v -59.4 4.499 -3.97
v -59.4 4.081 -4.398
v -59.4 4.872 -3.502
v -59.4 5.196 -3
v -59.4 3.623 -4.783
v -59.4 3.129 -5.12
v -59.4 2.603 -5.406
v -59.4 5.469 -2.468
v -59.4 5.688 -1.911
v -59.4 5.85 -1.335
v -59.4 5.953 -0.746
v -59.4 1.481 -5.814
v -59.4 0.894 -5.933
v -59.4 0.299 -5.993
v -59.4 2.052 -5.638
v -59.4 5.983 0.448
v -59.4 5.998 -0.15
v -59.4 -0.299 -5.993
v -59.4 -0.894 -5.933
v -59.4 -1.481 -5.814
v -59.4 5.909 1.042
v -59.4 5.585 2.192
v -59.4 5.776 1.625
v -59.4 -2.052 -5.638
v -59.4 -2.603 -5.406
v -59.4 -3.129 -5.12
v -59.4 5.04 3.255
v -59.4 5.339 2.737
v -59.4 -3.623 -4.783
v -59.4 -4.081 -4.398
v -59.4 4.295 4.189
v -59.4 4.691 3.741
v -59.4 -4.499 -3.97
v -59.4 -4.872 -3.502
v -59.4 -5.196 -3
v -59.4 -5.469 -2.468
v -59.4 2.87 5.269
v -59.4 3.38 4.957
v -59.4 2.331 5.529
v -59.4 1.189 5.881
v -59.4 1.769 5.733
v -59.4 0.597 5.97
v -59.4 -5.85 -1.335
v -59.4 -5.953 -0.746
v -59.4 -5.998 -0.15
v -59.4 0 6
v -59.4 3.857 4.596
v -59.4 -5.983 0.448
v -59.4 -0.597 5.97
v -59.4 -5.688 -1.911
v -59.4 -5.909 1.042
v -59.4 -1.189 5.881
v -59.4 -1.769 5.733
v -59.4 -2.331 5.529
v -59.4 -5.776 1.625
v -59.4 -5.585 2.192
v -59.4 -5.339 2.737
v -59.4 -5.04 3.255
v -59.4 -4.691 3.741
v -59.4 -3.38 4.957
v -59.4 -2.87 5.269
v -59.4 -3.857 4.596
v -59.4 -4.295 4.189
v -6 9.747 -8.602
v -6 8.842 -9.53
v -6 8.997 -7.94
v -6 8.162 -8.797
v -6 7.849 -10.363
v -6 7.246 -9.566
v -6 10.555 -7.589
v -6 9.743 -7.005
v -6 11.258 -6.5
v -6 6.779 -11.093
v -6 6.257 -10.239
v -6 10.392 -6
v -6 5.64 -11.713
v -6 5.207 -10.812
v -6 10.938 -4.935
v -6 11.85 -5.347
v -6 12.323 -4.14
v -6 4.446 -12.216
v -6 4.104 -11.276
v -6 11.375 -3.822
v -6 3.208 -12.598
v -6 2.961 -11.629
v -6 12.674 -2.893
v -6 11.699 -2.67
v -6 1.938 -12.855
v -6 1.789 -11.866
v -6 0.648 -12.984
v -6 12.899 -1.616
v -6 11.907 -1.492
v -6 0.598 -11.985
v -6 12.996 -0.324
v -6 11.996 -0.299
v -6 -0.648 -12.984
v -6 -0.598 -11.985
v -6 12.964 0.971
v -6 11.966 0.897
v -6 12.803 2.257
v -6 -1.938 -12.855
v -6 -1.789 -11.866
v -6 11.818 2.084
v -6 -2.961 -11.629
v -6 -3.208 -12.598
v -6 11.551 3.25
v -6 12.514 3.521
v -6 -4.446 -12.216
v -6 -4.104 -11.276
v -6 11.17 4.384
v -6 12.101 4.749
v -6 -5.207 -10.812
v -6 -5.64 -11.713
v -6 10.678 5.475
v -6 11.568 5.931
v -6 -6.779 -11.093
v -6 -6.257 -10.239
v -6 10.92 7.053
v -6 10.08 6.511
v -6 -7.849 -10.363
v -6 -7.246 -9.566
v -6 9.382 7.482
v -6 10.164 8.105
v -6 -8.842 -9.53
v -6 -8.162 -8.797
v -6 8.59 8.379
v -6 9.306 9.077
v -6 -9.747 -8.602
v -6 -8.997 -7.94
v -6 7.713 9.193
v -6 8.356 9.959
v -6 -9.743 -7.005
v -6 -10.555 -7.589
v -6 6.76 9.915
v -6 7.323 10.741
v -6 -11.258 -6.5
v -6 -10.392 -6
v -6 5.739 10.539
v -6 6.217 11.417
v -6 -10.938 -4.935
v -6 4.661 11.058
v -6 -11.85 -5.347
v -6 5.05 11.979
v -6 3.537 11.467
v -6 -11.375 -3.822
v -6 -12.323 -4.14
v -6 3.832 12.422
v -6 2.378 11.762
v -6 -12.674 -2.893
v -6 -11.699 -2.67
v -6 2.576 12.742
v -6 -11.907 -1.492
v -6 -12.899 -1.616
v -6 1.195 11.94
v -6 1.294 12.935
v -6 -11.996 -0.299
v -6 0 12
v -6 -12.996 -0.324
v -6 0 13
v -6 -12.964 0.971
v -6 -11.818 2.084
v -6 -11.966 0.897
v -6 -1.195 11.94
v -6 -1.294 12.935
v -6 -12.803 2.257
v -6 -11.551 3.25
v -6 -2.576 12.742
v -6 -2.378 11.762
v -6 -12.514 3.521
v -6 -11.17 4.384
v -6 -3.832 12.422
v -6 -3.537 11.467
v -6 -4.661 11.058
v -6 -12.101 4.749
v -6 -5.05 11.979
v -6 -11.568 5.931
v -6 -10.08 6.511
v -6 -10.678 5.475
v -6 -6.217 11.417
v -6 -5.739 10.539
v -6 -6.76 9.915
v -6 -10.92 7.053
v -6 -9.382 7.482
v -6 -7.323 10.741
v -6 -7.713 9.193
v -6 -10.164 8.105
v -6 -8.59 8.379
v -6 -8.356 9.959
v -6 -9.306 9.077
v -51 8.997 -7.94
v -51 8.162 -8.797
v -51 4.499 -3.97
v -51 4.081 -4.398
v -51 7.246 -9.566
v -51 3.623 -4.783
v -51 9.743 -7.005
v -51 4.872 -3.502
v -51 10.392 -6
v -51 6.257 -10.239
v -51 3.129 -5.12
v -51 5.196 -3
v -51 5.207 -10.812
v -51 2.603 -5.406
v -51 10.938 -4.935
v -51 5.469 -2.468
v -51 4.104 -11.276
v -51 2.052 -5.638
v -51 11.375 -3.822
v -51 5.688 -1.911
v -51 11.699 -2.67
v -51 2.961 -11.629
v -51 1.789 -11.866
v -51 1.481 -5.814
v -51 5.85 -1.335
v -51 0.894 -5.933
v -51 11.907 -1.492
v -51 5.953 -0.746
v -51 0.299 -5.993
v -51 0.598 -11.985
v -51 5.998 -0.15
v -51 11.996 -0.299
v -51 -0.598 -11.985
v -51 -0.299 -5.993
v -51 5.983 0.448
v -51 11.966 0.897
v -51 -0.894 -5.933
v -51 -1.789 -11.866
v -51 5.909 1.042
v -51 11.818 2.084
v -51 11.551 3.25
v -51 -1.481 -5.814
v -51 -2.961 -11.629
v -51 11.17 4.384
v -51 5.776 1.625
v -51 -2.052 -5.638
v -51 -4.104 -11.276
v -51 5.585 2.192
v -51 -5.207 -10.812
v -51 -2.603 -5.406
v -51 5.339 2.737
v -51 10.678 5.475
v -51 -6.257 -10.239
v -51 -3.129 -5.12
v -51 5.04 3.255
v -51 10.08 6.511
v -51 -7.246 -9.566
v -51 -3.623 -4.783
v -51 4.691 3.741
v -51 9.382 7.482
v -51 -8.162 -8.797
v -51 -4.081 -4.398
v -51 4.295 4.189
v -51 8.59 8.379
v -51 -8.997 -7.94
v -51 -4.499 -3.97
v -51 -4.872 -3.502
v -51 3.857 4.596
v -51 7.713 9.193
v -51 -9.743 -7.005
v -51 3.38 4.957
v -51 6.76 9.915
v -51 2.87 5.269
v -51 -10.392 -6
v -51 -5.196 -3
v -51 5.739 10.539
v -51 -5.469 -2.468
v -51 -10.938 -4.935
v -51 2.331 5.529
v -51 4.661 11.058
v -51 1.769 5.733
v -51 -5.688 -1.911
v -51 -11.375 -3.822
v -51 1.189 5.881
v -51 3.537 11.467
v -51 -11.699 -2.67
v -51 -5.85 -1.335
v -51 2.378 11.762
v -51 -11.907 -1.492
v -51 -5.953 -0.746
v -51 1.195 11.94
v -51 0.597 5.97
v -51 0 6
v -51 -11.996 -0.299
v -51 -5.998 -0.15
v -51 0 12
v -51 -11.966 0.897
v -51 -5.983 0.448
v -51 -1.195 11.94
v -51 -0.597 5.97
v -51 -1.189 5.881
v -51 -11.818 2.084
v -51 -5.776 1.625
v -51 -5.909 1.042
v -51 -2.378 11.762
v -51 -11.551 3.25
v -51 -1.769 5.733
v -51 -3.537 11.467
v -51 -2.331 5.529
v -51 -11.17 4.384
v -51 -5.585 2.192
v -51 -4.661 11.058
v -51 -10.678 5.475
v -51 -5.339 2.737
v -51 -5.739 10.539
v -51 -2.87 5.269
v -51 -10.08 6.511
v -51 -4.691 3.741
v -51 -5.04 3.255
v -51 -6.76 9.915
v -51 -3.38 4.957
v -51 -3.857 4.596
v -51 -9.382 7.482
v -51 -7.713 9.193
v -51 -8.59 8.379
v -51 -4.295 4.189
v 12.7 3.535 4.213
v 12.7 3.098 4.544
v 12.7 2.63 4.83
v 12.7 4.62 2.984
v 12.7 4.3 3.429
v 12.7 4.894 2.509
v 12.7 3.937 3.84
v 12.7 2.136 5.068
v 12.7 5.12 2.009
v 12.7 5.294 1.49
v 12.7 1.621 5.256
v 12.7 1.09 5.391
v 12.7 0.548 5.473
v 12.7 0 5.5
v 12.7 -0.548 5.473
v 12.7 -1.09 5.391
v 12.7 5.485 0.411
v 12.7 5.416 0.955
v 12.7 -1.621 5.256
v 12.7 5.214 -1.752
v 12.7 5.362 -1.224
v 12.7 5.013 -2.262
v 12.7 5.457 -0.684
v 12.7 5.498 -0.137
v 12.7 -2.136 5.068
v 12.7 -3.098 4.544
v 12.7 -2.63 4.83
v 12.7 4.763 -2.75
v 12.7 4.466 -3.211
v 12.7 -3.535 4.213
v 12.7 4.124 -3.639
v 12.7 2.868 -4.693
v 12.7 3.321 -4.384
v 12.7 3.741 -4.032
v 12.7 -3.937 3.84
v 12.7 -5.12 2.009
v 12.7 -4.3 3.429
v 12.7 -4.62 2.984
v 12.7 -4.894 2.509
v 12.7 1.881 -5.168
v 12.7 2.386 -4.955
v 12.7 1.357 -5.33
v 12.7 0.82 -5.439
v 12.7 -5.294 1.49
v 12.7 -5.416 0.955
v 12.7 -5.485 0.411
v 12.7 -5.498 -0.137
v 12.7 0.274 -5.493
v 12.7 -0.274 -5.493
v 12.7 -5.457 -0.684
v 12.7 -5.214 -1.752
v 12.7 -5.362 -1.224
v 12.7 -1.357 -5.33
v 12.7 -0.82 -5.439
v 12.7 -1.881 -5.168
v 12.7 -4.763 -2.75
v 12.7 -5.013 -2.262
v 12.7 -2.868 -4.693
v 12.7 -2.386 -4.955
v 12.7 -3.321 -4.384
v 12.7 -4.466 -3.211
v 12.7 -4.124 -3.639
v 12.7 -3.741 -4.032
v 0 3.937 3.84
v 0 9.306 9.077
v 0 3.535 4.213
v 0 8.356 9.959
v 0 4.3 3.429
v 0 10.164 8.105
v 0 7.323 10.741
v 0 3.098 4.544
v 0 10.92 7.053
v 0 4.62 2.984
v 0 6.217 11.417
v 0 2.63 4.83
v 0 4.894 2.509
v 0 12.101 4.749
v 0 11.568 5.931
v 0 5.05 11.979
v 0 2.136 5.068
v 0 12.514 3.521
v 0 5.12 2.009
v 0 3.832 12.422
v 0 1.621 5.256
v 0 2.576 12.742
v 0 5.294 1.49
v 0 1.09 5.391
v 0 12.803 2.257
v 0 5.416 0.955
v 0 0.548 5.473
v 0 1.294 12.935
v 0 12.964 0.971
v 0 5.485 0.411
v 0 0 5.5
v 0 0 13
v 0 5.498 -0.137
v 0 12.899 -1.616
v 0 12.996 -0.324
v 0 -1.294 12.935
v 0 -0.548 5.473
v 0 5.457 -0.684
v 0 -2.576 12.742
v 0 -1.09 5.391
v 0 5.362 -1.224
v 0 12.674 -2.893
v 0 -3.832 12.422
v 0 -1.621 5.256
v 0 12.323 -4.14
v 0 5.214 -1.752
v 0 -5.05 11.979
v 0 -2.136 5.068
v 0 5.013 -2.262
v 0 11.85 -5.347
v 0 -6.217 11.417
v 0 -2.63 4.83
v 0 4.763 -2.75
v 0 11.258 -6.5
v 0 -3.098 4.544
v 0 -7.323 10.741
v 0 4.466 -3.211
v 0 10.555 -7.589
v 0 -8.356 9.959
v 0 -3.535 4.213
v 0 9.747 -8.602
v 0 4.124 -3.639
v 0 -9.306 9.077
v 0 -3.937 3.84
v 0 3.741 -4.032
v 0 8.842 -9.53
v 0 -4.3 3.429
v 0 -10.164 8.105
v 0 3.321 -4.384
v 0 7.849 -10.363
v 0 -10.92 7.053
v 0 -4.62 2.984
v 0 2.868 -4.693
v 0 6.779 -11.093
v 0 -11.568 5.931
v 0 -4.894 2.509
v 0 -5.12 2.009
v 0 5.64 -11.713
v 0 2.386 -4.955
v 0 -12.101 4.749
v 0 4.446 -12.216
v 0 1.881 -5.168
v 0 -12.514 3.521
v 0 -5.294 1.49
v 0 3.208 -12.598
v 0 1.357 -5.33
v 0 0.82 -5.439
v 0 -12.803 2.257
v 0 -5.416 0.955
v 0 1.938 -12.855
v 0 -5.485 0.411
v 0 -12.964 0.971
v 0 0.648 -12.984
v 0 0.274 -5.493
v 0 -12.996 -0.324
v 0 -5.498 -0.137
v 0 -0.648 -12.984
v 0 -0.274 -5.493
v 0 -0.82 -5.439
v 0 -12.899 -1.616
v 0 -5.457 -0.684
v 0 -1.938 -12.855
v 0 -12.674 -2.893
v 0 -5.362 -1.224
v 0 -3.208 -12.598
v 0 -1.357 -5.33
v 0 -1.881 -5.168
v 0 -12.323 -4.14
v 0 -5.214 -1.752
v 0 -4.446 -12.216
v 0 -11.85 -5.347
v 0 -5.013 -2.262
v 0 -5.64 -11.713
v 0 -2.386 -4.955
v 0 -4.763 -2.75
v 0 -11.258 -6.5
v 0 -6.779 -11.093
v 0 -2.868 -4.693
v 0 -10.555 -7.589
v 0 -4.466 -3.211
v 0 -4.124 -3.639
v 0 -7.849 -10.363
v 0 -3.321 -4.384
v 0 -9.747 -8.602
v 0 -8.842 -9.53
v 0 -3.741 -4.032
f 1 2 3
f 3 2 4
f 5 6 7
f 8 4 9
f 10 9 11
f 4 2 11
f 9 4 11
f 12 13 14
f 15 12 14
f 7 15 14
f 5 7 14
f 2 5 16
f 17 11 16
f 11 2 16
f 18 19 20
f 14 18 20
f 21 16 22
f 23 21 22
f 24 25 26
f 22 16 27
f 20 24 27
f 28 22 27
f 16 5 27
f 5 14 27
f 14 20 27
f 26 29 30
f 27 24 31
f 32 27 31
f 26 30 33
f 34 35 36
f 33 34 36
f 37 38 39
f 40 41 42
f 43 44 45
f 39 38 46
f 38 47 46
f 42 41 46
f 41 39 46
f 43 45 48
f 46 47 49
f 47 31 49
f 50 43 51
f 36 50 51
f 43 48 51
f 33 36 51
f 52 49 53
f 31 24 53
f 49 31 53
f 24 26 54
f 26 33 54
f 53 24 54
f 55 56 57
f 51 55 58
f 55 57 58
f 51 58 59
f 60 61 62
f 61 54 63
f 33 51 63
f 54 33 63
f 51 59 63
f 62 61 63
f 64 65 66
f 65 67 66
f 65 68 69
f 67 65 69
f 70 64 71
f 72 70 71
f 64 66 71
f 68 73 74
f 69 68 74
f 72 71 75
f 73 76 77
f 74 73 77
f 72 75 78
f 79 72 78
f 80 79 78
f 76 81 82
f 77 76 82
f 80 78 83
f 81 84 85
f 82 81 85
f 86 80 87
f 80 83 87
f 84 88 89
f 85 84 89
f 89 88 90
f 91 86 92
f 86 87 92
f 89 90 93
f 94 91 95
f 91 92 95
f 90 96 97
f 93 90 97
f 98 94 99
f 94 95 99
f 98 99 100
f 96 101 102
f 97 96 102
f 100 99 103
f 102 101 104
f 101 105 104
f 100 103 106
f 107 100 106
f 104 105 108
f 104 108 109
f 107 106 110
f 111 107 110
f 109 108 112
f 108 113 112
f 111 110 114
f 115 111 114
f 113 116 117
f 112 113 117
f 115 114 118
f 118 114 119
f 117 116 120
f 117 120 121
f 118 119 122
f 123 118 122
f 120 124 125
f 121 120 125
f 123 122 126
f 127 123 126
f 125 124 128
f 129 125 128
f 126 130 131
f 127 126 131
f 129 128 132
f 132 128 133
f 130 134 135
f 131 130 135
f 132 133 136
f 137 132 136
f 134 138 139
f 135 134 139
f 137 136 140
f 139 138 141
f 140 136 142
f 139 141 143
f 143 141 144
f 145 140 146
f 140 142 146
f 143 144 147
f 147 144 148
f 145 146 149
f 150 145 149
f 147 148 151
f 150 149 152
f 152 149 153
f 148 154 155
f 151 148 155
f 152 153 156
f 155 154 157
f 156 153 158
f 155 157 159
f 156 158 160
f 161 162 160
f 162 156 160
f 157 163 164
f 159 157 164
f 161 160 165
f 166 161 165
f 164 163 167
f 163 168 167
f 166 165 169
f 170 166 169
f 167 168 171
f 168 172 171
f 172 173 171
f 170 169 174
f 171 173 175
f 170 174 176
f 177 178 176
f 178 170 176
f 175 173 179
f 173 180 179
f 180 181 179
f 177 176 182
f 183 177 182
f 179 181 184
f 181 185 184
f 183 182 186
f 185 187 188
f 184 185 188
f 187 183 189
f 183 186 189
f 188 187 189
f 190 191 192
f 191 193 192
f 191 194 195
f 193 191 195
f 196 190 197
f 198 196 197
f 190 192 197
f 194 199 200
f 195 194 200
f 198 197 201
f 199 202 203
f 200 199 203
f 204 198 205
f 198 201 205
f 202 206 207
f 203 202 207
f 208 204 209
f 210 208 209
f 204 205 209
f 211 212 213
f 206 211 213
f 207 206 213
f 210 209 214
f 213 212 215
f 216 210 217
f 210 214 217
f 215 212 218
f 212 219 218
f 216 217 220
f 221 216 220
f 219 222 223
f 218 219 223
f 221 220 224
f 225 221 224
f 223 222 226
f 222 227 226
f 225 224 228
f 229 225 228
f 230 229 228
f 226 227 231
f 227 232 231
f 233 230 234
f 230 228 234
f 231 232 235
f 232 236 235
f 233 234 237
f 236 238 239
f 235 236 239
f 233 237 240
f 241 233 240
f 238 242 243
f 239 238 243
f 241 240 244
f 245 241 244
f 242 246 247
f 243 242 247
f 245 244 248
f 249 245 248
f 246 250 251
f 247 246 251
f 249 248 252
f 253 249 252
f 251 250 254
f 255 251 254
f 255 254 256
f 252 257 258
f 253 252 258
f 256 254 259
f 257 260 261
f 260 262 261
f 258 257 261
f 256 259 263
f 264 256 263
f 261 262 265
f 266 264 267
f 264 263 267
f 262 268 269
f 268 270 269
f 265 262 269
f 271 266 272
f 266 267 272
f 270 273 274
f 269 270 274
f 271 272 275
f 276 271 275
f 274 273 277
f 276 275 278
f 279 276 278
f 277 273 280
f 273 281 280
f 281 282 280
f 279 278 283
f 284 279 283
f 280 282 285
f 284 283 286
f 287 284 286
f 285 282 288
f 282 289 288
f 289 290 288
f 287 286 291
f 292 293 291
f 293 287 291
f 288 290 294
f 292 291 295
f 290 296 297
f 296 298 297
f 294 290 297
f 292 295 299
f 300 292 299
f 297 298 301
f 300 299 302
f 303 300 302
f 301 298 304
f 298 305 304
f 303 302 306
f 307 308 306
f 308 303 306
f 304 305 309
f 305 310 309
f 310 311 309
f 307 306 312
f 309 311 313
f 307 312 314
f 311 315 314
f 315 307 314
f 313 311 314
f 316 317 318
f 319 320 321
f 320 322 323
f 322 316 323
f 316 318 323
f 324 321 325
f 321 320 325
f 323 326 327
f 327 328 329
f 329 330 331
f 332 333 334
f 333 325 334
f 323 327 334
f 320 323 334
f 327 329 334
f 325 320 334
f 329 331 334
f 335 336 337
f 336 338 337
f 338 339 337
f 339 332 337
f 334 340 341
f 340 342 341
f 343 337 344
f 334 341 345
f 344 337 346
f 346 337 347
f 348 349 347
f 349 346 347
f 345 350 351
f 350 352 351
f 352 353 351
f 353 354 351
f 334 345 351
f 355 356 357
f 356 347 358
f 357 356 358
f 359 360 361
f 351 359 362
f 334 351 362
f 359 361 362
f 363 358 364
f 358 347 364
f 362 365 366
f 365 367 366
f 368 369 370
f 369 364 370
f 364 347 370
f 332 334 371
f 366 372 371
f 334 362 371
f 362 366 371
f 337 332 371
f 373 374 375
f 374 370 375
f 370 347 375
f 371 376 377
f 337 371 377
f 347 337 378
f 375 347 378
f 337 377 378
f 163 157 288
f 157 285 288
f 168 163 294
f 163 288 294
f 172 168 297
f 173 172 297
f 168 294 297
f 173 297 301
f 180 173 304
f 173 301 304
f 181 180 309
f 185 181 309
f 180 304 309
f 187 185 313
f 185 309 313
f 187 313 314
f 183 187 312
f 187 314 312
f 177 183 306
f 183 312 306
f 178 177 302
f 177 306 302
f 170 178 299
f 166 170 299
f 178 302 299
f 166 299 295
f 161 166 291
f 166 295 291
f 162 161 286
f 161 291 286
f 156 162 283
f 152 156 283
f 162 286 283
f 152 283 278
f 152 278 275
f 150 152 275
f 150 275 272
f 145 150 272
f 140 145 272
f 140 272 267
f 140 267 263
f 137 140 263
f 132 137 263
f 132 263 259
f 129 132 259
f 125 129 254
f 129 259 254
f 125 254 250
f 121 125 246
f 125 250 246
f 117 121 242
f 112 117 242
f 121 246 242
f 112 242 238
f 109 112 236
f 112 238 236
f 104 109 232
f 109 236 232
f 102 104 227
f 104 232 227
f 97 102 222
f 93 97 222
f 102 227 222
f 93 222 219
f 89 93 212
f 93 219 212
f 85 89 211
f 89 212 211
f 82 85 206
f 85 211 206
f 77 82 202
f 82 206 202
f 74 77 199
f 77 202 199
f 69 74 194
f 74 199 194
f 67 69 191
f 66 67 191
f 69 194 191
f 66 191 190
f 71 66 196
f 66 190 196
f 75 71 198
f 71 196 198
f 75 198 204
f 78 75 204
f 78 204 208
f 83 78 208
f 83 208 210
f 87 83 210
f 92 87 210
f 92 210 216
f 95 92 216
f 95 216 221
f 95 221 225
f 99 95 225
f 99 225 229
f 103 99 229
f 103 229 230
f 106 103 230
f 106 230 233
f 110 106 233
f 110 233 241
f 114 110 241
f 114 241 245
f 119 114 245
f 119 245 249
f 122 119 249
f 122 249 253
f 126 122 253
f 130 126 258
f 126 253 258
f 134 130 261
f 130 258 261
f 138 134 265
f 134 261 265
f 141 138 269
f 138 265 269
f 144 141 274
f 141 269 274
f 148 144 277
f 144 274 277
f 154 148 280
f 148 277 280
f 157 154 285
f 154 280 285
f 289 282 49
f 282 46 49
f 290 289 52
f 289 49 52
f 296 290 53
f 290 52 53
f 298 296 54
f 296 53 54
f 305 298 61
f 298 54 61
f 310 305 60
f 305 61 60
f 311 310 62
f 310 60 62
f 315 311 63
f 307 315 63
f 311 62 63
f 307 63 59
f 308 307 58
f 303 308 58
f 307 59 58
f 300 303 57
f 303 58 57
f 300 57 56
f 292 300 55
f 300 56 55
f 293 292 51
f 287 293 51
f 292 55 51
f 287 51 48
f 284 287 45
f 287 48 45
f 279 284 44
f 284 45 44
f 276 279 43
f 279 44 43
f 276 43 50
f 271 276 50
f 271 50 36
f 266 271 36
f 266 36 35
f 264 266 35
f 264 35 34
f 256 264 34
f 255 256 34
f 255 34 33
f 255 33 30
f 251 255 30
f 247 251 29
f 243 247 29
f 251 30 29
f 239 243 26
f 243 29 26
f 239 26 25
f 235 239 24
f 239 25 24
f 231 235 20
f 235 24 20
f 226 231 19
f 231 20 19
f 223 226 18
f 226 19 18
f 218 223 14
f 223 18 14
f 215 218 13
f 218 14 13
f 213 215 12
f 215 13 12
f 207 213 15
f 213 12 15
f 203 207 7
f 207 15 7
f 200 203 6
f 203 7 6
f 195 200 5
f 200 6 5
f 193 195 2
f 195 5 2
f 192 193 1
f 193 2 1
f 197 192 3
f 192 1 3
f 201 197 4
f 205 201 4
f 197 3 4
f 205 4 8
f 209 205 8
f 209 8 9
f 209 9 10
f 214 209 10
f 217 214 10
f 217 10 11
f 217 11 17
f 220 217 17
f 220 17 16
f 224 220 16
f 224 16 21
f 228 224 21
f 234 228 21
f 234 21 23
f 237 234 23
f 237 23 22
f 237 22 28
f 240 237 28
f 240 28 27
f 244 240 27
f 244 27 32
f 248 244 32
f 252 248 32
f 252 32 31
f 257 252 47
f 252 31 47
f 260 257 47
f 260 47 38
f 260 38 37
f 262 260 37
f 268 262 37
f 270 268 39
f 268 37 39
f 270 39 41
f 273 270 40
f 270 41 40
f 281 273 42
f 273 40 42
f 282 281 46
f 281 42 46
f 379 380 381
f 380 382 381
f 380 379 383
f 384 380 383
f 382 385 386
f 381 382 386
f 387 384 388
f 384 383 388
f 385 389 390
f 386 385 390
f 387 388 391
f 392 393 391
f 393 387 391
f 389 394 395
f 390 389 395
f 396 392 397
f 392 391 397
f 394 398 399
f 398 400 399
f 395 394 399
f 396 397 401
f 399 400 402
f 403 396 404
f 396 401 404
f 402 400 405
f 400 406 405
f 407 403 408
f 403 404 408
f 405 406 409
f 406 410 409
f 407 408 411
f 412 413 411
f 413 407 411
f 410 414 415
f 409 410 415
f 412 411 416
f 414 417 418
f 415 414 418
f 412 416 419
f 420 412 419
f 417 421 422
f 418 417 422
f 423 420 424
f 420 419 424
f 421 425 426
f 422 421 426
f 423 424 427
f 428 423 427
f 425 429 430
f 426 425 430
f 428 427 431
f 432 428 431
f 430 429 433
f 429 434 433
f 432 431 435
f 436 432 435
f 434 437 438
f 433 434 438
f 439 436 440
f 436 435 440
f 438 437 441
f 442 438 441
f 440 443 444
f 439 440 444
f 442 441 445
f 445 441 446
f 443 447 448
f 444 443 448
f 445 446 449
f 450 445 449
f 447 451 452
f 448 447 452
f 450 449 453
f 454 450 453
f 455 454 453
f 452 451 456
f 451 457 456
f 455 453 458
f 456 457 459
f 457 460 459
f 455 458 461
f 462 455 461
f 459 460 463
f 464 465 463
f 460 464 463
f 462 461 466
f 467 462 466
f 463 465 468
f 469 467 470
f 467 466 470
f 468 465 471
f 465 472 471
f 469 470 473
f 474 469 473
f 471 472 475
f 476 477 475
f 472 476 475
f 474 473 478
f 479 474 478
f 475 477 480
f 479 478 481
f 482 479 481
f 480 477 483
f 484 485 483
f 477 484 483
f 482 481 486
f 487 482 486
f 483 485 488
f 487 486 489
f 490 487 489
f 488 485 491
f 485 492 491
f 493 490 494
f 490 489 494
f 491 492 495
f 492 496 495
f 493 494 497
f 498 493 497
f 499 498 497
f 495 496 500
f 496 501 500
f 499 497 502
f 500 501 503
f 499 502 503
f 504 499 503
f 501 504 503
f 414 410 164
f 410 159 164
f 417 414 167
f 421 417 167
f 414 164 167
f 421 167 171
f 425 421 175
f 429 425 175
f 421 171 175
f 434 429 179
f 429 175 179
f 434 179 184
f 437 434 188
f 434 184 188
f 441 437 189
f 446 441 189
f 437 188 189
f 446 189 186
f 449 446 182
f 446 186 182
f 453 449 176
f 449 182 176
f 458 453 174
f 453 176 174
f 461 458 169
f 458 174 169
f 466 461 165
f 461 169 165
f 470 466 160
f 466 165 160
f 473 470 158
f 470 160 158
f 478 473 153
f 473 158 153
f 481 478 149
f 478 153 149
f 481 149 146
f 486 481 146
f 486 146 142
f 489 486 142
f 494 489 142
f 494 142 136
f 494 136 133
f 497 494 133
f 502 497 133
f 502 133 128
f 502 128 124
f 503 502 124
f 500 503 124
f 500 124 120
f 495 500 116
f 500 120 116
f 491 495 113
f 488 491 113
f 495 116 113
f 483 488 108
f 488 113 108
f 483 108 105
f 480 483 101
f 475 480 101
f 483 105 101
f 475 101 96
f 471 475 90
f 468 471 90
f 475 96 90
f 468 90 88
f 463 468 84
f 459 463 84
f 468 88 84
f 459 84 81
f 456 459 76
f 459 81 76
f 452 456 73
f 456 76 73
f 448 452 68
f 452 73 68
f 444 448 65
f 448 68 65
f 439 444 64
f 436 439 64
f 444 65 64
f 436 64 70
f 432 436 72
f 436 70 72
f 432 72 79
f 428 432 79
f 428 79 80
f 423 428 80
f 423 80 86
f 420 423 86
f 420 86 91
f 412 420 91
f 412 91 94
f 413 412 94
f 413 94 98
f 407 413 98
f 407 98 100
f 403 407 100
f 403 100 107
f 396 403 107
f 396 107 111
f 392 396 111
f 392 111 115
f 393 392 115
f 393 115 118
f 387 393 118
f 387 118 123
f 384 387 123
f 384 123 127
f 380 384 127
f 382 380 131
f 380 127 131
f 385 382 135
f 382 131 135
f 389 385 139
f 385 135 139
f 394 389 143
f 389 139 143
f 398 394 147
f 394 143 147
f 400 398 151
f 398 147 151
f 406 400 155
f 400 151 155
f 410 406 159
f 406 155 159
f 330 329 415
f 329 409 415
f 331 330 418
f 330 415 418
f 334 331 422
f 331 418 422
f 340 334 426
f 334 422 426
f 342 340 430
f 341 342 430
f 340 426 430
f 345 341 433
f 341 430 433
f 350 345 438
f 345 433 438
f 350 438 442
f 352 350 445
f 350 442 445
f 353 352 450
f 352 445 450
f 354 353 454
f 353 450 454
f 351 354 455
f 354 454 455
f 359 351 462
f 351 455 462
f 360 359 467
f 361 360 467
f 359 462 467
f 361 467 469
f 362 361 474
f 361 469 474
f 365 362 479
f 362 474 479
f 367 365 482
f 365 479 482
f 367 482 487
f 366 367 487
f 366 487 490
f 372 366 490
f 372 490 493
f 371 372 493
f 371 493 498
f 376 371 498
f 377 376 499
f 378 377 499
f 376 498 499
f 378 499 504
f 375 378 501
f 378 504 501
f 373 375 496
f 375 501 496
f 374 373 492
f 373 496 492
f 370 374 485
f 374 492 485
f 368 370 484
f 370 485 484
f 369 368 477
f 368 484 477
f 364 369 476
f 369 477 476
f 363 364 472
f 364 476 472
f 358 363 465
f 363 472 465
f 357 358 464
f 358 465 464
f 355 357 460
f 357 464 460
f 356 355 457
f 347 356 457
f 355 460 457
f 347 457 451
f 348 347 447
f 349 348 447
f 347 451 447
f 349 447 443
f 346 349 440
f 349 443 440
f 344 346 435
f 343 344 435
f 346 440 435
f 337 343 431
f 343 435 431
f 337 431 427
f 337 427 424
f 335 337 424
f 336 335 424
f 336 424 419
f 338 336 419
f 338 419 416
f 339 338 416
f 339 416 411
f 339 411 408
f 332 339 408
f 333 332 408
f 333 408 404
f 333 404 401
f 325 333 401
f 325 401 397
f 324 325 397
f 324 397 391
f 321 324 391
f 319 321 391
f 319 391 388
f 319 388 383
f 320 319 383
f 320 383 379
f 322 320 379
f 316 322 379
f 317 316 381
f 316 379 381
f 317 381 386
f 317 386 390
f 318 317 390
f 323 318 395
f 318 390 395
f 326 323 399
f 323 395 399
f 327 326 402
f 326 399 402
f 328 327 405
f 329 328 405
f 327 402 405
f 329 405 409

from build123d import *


with BuildPart() as part:
    # Sensor_Turck Sketch → Sensor_Turck (revolve)
    with BuildSketch(Plane.XY):
        Polygon((12.7, 0), (12.7, 5.5), (0, 5.5), (0, 13), (-6, 13), (-6, 12), (-51, 12), (-51, 6), (-59.4, 6), (-59.4, 0), align=None)
    revolve(axis=Axis((-1000, 0, 0), (1, 0, 0)))


solid = part.part
